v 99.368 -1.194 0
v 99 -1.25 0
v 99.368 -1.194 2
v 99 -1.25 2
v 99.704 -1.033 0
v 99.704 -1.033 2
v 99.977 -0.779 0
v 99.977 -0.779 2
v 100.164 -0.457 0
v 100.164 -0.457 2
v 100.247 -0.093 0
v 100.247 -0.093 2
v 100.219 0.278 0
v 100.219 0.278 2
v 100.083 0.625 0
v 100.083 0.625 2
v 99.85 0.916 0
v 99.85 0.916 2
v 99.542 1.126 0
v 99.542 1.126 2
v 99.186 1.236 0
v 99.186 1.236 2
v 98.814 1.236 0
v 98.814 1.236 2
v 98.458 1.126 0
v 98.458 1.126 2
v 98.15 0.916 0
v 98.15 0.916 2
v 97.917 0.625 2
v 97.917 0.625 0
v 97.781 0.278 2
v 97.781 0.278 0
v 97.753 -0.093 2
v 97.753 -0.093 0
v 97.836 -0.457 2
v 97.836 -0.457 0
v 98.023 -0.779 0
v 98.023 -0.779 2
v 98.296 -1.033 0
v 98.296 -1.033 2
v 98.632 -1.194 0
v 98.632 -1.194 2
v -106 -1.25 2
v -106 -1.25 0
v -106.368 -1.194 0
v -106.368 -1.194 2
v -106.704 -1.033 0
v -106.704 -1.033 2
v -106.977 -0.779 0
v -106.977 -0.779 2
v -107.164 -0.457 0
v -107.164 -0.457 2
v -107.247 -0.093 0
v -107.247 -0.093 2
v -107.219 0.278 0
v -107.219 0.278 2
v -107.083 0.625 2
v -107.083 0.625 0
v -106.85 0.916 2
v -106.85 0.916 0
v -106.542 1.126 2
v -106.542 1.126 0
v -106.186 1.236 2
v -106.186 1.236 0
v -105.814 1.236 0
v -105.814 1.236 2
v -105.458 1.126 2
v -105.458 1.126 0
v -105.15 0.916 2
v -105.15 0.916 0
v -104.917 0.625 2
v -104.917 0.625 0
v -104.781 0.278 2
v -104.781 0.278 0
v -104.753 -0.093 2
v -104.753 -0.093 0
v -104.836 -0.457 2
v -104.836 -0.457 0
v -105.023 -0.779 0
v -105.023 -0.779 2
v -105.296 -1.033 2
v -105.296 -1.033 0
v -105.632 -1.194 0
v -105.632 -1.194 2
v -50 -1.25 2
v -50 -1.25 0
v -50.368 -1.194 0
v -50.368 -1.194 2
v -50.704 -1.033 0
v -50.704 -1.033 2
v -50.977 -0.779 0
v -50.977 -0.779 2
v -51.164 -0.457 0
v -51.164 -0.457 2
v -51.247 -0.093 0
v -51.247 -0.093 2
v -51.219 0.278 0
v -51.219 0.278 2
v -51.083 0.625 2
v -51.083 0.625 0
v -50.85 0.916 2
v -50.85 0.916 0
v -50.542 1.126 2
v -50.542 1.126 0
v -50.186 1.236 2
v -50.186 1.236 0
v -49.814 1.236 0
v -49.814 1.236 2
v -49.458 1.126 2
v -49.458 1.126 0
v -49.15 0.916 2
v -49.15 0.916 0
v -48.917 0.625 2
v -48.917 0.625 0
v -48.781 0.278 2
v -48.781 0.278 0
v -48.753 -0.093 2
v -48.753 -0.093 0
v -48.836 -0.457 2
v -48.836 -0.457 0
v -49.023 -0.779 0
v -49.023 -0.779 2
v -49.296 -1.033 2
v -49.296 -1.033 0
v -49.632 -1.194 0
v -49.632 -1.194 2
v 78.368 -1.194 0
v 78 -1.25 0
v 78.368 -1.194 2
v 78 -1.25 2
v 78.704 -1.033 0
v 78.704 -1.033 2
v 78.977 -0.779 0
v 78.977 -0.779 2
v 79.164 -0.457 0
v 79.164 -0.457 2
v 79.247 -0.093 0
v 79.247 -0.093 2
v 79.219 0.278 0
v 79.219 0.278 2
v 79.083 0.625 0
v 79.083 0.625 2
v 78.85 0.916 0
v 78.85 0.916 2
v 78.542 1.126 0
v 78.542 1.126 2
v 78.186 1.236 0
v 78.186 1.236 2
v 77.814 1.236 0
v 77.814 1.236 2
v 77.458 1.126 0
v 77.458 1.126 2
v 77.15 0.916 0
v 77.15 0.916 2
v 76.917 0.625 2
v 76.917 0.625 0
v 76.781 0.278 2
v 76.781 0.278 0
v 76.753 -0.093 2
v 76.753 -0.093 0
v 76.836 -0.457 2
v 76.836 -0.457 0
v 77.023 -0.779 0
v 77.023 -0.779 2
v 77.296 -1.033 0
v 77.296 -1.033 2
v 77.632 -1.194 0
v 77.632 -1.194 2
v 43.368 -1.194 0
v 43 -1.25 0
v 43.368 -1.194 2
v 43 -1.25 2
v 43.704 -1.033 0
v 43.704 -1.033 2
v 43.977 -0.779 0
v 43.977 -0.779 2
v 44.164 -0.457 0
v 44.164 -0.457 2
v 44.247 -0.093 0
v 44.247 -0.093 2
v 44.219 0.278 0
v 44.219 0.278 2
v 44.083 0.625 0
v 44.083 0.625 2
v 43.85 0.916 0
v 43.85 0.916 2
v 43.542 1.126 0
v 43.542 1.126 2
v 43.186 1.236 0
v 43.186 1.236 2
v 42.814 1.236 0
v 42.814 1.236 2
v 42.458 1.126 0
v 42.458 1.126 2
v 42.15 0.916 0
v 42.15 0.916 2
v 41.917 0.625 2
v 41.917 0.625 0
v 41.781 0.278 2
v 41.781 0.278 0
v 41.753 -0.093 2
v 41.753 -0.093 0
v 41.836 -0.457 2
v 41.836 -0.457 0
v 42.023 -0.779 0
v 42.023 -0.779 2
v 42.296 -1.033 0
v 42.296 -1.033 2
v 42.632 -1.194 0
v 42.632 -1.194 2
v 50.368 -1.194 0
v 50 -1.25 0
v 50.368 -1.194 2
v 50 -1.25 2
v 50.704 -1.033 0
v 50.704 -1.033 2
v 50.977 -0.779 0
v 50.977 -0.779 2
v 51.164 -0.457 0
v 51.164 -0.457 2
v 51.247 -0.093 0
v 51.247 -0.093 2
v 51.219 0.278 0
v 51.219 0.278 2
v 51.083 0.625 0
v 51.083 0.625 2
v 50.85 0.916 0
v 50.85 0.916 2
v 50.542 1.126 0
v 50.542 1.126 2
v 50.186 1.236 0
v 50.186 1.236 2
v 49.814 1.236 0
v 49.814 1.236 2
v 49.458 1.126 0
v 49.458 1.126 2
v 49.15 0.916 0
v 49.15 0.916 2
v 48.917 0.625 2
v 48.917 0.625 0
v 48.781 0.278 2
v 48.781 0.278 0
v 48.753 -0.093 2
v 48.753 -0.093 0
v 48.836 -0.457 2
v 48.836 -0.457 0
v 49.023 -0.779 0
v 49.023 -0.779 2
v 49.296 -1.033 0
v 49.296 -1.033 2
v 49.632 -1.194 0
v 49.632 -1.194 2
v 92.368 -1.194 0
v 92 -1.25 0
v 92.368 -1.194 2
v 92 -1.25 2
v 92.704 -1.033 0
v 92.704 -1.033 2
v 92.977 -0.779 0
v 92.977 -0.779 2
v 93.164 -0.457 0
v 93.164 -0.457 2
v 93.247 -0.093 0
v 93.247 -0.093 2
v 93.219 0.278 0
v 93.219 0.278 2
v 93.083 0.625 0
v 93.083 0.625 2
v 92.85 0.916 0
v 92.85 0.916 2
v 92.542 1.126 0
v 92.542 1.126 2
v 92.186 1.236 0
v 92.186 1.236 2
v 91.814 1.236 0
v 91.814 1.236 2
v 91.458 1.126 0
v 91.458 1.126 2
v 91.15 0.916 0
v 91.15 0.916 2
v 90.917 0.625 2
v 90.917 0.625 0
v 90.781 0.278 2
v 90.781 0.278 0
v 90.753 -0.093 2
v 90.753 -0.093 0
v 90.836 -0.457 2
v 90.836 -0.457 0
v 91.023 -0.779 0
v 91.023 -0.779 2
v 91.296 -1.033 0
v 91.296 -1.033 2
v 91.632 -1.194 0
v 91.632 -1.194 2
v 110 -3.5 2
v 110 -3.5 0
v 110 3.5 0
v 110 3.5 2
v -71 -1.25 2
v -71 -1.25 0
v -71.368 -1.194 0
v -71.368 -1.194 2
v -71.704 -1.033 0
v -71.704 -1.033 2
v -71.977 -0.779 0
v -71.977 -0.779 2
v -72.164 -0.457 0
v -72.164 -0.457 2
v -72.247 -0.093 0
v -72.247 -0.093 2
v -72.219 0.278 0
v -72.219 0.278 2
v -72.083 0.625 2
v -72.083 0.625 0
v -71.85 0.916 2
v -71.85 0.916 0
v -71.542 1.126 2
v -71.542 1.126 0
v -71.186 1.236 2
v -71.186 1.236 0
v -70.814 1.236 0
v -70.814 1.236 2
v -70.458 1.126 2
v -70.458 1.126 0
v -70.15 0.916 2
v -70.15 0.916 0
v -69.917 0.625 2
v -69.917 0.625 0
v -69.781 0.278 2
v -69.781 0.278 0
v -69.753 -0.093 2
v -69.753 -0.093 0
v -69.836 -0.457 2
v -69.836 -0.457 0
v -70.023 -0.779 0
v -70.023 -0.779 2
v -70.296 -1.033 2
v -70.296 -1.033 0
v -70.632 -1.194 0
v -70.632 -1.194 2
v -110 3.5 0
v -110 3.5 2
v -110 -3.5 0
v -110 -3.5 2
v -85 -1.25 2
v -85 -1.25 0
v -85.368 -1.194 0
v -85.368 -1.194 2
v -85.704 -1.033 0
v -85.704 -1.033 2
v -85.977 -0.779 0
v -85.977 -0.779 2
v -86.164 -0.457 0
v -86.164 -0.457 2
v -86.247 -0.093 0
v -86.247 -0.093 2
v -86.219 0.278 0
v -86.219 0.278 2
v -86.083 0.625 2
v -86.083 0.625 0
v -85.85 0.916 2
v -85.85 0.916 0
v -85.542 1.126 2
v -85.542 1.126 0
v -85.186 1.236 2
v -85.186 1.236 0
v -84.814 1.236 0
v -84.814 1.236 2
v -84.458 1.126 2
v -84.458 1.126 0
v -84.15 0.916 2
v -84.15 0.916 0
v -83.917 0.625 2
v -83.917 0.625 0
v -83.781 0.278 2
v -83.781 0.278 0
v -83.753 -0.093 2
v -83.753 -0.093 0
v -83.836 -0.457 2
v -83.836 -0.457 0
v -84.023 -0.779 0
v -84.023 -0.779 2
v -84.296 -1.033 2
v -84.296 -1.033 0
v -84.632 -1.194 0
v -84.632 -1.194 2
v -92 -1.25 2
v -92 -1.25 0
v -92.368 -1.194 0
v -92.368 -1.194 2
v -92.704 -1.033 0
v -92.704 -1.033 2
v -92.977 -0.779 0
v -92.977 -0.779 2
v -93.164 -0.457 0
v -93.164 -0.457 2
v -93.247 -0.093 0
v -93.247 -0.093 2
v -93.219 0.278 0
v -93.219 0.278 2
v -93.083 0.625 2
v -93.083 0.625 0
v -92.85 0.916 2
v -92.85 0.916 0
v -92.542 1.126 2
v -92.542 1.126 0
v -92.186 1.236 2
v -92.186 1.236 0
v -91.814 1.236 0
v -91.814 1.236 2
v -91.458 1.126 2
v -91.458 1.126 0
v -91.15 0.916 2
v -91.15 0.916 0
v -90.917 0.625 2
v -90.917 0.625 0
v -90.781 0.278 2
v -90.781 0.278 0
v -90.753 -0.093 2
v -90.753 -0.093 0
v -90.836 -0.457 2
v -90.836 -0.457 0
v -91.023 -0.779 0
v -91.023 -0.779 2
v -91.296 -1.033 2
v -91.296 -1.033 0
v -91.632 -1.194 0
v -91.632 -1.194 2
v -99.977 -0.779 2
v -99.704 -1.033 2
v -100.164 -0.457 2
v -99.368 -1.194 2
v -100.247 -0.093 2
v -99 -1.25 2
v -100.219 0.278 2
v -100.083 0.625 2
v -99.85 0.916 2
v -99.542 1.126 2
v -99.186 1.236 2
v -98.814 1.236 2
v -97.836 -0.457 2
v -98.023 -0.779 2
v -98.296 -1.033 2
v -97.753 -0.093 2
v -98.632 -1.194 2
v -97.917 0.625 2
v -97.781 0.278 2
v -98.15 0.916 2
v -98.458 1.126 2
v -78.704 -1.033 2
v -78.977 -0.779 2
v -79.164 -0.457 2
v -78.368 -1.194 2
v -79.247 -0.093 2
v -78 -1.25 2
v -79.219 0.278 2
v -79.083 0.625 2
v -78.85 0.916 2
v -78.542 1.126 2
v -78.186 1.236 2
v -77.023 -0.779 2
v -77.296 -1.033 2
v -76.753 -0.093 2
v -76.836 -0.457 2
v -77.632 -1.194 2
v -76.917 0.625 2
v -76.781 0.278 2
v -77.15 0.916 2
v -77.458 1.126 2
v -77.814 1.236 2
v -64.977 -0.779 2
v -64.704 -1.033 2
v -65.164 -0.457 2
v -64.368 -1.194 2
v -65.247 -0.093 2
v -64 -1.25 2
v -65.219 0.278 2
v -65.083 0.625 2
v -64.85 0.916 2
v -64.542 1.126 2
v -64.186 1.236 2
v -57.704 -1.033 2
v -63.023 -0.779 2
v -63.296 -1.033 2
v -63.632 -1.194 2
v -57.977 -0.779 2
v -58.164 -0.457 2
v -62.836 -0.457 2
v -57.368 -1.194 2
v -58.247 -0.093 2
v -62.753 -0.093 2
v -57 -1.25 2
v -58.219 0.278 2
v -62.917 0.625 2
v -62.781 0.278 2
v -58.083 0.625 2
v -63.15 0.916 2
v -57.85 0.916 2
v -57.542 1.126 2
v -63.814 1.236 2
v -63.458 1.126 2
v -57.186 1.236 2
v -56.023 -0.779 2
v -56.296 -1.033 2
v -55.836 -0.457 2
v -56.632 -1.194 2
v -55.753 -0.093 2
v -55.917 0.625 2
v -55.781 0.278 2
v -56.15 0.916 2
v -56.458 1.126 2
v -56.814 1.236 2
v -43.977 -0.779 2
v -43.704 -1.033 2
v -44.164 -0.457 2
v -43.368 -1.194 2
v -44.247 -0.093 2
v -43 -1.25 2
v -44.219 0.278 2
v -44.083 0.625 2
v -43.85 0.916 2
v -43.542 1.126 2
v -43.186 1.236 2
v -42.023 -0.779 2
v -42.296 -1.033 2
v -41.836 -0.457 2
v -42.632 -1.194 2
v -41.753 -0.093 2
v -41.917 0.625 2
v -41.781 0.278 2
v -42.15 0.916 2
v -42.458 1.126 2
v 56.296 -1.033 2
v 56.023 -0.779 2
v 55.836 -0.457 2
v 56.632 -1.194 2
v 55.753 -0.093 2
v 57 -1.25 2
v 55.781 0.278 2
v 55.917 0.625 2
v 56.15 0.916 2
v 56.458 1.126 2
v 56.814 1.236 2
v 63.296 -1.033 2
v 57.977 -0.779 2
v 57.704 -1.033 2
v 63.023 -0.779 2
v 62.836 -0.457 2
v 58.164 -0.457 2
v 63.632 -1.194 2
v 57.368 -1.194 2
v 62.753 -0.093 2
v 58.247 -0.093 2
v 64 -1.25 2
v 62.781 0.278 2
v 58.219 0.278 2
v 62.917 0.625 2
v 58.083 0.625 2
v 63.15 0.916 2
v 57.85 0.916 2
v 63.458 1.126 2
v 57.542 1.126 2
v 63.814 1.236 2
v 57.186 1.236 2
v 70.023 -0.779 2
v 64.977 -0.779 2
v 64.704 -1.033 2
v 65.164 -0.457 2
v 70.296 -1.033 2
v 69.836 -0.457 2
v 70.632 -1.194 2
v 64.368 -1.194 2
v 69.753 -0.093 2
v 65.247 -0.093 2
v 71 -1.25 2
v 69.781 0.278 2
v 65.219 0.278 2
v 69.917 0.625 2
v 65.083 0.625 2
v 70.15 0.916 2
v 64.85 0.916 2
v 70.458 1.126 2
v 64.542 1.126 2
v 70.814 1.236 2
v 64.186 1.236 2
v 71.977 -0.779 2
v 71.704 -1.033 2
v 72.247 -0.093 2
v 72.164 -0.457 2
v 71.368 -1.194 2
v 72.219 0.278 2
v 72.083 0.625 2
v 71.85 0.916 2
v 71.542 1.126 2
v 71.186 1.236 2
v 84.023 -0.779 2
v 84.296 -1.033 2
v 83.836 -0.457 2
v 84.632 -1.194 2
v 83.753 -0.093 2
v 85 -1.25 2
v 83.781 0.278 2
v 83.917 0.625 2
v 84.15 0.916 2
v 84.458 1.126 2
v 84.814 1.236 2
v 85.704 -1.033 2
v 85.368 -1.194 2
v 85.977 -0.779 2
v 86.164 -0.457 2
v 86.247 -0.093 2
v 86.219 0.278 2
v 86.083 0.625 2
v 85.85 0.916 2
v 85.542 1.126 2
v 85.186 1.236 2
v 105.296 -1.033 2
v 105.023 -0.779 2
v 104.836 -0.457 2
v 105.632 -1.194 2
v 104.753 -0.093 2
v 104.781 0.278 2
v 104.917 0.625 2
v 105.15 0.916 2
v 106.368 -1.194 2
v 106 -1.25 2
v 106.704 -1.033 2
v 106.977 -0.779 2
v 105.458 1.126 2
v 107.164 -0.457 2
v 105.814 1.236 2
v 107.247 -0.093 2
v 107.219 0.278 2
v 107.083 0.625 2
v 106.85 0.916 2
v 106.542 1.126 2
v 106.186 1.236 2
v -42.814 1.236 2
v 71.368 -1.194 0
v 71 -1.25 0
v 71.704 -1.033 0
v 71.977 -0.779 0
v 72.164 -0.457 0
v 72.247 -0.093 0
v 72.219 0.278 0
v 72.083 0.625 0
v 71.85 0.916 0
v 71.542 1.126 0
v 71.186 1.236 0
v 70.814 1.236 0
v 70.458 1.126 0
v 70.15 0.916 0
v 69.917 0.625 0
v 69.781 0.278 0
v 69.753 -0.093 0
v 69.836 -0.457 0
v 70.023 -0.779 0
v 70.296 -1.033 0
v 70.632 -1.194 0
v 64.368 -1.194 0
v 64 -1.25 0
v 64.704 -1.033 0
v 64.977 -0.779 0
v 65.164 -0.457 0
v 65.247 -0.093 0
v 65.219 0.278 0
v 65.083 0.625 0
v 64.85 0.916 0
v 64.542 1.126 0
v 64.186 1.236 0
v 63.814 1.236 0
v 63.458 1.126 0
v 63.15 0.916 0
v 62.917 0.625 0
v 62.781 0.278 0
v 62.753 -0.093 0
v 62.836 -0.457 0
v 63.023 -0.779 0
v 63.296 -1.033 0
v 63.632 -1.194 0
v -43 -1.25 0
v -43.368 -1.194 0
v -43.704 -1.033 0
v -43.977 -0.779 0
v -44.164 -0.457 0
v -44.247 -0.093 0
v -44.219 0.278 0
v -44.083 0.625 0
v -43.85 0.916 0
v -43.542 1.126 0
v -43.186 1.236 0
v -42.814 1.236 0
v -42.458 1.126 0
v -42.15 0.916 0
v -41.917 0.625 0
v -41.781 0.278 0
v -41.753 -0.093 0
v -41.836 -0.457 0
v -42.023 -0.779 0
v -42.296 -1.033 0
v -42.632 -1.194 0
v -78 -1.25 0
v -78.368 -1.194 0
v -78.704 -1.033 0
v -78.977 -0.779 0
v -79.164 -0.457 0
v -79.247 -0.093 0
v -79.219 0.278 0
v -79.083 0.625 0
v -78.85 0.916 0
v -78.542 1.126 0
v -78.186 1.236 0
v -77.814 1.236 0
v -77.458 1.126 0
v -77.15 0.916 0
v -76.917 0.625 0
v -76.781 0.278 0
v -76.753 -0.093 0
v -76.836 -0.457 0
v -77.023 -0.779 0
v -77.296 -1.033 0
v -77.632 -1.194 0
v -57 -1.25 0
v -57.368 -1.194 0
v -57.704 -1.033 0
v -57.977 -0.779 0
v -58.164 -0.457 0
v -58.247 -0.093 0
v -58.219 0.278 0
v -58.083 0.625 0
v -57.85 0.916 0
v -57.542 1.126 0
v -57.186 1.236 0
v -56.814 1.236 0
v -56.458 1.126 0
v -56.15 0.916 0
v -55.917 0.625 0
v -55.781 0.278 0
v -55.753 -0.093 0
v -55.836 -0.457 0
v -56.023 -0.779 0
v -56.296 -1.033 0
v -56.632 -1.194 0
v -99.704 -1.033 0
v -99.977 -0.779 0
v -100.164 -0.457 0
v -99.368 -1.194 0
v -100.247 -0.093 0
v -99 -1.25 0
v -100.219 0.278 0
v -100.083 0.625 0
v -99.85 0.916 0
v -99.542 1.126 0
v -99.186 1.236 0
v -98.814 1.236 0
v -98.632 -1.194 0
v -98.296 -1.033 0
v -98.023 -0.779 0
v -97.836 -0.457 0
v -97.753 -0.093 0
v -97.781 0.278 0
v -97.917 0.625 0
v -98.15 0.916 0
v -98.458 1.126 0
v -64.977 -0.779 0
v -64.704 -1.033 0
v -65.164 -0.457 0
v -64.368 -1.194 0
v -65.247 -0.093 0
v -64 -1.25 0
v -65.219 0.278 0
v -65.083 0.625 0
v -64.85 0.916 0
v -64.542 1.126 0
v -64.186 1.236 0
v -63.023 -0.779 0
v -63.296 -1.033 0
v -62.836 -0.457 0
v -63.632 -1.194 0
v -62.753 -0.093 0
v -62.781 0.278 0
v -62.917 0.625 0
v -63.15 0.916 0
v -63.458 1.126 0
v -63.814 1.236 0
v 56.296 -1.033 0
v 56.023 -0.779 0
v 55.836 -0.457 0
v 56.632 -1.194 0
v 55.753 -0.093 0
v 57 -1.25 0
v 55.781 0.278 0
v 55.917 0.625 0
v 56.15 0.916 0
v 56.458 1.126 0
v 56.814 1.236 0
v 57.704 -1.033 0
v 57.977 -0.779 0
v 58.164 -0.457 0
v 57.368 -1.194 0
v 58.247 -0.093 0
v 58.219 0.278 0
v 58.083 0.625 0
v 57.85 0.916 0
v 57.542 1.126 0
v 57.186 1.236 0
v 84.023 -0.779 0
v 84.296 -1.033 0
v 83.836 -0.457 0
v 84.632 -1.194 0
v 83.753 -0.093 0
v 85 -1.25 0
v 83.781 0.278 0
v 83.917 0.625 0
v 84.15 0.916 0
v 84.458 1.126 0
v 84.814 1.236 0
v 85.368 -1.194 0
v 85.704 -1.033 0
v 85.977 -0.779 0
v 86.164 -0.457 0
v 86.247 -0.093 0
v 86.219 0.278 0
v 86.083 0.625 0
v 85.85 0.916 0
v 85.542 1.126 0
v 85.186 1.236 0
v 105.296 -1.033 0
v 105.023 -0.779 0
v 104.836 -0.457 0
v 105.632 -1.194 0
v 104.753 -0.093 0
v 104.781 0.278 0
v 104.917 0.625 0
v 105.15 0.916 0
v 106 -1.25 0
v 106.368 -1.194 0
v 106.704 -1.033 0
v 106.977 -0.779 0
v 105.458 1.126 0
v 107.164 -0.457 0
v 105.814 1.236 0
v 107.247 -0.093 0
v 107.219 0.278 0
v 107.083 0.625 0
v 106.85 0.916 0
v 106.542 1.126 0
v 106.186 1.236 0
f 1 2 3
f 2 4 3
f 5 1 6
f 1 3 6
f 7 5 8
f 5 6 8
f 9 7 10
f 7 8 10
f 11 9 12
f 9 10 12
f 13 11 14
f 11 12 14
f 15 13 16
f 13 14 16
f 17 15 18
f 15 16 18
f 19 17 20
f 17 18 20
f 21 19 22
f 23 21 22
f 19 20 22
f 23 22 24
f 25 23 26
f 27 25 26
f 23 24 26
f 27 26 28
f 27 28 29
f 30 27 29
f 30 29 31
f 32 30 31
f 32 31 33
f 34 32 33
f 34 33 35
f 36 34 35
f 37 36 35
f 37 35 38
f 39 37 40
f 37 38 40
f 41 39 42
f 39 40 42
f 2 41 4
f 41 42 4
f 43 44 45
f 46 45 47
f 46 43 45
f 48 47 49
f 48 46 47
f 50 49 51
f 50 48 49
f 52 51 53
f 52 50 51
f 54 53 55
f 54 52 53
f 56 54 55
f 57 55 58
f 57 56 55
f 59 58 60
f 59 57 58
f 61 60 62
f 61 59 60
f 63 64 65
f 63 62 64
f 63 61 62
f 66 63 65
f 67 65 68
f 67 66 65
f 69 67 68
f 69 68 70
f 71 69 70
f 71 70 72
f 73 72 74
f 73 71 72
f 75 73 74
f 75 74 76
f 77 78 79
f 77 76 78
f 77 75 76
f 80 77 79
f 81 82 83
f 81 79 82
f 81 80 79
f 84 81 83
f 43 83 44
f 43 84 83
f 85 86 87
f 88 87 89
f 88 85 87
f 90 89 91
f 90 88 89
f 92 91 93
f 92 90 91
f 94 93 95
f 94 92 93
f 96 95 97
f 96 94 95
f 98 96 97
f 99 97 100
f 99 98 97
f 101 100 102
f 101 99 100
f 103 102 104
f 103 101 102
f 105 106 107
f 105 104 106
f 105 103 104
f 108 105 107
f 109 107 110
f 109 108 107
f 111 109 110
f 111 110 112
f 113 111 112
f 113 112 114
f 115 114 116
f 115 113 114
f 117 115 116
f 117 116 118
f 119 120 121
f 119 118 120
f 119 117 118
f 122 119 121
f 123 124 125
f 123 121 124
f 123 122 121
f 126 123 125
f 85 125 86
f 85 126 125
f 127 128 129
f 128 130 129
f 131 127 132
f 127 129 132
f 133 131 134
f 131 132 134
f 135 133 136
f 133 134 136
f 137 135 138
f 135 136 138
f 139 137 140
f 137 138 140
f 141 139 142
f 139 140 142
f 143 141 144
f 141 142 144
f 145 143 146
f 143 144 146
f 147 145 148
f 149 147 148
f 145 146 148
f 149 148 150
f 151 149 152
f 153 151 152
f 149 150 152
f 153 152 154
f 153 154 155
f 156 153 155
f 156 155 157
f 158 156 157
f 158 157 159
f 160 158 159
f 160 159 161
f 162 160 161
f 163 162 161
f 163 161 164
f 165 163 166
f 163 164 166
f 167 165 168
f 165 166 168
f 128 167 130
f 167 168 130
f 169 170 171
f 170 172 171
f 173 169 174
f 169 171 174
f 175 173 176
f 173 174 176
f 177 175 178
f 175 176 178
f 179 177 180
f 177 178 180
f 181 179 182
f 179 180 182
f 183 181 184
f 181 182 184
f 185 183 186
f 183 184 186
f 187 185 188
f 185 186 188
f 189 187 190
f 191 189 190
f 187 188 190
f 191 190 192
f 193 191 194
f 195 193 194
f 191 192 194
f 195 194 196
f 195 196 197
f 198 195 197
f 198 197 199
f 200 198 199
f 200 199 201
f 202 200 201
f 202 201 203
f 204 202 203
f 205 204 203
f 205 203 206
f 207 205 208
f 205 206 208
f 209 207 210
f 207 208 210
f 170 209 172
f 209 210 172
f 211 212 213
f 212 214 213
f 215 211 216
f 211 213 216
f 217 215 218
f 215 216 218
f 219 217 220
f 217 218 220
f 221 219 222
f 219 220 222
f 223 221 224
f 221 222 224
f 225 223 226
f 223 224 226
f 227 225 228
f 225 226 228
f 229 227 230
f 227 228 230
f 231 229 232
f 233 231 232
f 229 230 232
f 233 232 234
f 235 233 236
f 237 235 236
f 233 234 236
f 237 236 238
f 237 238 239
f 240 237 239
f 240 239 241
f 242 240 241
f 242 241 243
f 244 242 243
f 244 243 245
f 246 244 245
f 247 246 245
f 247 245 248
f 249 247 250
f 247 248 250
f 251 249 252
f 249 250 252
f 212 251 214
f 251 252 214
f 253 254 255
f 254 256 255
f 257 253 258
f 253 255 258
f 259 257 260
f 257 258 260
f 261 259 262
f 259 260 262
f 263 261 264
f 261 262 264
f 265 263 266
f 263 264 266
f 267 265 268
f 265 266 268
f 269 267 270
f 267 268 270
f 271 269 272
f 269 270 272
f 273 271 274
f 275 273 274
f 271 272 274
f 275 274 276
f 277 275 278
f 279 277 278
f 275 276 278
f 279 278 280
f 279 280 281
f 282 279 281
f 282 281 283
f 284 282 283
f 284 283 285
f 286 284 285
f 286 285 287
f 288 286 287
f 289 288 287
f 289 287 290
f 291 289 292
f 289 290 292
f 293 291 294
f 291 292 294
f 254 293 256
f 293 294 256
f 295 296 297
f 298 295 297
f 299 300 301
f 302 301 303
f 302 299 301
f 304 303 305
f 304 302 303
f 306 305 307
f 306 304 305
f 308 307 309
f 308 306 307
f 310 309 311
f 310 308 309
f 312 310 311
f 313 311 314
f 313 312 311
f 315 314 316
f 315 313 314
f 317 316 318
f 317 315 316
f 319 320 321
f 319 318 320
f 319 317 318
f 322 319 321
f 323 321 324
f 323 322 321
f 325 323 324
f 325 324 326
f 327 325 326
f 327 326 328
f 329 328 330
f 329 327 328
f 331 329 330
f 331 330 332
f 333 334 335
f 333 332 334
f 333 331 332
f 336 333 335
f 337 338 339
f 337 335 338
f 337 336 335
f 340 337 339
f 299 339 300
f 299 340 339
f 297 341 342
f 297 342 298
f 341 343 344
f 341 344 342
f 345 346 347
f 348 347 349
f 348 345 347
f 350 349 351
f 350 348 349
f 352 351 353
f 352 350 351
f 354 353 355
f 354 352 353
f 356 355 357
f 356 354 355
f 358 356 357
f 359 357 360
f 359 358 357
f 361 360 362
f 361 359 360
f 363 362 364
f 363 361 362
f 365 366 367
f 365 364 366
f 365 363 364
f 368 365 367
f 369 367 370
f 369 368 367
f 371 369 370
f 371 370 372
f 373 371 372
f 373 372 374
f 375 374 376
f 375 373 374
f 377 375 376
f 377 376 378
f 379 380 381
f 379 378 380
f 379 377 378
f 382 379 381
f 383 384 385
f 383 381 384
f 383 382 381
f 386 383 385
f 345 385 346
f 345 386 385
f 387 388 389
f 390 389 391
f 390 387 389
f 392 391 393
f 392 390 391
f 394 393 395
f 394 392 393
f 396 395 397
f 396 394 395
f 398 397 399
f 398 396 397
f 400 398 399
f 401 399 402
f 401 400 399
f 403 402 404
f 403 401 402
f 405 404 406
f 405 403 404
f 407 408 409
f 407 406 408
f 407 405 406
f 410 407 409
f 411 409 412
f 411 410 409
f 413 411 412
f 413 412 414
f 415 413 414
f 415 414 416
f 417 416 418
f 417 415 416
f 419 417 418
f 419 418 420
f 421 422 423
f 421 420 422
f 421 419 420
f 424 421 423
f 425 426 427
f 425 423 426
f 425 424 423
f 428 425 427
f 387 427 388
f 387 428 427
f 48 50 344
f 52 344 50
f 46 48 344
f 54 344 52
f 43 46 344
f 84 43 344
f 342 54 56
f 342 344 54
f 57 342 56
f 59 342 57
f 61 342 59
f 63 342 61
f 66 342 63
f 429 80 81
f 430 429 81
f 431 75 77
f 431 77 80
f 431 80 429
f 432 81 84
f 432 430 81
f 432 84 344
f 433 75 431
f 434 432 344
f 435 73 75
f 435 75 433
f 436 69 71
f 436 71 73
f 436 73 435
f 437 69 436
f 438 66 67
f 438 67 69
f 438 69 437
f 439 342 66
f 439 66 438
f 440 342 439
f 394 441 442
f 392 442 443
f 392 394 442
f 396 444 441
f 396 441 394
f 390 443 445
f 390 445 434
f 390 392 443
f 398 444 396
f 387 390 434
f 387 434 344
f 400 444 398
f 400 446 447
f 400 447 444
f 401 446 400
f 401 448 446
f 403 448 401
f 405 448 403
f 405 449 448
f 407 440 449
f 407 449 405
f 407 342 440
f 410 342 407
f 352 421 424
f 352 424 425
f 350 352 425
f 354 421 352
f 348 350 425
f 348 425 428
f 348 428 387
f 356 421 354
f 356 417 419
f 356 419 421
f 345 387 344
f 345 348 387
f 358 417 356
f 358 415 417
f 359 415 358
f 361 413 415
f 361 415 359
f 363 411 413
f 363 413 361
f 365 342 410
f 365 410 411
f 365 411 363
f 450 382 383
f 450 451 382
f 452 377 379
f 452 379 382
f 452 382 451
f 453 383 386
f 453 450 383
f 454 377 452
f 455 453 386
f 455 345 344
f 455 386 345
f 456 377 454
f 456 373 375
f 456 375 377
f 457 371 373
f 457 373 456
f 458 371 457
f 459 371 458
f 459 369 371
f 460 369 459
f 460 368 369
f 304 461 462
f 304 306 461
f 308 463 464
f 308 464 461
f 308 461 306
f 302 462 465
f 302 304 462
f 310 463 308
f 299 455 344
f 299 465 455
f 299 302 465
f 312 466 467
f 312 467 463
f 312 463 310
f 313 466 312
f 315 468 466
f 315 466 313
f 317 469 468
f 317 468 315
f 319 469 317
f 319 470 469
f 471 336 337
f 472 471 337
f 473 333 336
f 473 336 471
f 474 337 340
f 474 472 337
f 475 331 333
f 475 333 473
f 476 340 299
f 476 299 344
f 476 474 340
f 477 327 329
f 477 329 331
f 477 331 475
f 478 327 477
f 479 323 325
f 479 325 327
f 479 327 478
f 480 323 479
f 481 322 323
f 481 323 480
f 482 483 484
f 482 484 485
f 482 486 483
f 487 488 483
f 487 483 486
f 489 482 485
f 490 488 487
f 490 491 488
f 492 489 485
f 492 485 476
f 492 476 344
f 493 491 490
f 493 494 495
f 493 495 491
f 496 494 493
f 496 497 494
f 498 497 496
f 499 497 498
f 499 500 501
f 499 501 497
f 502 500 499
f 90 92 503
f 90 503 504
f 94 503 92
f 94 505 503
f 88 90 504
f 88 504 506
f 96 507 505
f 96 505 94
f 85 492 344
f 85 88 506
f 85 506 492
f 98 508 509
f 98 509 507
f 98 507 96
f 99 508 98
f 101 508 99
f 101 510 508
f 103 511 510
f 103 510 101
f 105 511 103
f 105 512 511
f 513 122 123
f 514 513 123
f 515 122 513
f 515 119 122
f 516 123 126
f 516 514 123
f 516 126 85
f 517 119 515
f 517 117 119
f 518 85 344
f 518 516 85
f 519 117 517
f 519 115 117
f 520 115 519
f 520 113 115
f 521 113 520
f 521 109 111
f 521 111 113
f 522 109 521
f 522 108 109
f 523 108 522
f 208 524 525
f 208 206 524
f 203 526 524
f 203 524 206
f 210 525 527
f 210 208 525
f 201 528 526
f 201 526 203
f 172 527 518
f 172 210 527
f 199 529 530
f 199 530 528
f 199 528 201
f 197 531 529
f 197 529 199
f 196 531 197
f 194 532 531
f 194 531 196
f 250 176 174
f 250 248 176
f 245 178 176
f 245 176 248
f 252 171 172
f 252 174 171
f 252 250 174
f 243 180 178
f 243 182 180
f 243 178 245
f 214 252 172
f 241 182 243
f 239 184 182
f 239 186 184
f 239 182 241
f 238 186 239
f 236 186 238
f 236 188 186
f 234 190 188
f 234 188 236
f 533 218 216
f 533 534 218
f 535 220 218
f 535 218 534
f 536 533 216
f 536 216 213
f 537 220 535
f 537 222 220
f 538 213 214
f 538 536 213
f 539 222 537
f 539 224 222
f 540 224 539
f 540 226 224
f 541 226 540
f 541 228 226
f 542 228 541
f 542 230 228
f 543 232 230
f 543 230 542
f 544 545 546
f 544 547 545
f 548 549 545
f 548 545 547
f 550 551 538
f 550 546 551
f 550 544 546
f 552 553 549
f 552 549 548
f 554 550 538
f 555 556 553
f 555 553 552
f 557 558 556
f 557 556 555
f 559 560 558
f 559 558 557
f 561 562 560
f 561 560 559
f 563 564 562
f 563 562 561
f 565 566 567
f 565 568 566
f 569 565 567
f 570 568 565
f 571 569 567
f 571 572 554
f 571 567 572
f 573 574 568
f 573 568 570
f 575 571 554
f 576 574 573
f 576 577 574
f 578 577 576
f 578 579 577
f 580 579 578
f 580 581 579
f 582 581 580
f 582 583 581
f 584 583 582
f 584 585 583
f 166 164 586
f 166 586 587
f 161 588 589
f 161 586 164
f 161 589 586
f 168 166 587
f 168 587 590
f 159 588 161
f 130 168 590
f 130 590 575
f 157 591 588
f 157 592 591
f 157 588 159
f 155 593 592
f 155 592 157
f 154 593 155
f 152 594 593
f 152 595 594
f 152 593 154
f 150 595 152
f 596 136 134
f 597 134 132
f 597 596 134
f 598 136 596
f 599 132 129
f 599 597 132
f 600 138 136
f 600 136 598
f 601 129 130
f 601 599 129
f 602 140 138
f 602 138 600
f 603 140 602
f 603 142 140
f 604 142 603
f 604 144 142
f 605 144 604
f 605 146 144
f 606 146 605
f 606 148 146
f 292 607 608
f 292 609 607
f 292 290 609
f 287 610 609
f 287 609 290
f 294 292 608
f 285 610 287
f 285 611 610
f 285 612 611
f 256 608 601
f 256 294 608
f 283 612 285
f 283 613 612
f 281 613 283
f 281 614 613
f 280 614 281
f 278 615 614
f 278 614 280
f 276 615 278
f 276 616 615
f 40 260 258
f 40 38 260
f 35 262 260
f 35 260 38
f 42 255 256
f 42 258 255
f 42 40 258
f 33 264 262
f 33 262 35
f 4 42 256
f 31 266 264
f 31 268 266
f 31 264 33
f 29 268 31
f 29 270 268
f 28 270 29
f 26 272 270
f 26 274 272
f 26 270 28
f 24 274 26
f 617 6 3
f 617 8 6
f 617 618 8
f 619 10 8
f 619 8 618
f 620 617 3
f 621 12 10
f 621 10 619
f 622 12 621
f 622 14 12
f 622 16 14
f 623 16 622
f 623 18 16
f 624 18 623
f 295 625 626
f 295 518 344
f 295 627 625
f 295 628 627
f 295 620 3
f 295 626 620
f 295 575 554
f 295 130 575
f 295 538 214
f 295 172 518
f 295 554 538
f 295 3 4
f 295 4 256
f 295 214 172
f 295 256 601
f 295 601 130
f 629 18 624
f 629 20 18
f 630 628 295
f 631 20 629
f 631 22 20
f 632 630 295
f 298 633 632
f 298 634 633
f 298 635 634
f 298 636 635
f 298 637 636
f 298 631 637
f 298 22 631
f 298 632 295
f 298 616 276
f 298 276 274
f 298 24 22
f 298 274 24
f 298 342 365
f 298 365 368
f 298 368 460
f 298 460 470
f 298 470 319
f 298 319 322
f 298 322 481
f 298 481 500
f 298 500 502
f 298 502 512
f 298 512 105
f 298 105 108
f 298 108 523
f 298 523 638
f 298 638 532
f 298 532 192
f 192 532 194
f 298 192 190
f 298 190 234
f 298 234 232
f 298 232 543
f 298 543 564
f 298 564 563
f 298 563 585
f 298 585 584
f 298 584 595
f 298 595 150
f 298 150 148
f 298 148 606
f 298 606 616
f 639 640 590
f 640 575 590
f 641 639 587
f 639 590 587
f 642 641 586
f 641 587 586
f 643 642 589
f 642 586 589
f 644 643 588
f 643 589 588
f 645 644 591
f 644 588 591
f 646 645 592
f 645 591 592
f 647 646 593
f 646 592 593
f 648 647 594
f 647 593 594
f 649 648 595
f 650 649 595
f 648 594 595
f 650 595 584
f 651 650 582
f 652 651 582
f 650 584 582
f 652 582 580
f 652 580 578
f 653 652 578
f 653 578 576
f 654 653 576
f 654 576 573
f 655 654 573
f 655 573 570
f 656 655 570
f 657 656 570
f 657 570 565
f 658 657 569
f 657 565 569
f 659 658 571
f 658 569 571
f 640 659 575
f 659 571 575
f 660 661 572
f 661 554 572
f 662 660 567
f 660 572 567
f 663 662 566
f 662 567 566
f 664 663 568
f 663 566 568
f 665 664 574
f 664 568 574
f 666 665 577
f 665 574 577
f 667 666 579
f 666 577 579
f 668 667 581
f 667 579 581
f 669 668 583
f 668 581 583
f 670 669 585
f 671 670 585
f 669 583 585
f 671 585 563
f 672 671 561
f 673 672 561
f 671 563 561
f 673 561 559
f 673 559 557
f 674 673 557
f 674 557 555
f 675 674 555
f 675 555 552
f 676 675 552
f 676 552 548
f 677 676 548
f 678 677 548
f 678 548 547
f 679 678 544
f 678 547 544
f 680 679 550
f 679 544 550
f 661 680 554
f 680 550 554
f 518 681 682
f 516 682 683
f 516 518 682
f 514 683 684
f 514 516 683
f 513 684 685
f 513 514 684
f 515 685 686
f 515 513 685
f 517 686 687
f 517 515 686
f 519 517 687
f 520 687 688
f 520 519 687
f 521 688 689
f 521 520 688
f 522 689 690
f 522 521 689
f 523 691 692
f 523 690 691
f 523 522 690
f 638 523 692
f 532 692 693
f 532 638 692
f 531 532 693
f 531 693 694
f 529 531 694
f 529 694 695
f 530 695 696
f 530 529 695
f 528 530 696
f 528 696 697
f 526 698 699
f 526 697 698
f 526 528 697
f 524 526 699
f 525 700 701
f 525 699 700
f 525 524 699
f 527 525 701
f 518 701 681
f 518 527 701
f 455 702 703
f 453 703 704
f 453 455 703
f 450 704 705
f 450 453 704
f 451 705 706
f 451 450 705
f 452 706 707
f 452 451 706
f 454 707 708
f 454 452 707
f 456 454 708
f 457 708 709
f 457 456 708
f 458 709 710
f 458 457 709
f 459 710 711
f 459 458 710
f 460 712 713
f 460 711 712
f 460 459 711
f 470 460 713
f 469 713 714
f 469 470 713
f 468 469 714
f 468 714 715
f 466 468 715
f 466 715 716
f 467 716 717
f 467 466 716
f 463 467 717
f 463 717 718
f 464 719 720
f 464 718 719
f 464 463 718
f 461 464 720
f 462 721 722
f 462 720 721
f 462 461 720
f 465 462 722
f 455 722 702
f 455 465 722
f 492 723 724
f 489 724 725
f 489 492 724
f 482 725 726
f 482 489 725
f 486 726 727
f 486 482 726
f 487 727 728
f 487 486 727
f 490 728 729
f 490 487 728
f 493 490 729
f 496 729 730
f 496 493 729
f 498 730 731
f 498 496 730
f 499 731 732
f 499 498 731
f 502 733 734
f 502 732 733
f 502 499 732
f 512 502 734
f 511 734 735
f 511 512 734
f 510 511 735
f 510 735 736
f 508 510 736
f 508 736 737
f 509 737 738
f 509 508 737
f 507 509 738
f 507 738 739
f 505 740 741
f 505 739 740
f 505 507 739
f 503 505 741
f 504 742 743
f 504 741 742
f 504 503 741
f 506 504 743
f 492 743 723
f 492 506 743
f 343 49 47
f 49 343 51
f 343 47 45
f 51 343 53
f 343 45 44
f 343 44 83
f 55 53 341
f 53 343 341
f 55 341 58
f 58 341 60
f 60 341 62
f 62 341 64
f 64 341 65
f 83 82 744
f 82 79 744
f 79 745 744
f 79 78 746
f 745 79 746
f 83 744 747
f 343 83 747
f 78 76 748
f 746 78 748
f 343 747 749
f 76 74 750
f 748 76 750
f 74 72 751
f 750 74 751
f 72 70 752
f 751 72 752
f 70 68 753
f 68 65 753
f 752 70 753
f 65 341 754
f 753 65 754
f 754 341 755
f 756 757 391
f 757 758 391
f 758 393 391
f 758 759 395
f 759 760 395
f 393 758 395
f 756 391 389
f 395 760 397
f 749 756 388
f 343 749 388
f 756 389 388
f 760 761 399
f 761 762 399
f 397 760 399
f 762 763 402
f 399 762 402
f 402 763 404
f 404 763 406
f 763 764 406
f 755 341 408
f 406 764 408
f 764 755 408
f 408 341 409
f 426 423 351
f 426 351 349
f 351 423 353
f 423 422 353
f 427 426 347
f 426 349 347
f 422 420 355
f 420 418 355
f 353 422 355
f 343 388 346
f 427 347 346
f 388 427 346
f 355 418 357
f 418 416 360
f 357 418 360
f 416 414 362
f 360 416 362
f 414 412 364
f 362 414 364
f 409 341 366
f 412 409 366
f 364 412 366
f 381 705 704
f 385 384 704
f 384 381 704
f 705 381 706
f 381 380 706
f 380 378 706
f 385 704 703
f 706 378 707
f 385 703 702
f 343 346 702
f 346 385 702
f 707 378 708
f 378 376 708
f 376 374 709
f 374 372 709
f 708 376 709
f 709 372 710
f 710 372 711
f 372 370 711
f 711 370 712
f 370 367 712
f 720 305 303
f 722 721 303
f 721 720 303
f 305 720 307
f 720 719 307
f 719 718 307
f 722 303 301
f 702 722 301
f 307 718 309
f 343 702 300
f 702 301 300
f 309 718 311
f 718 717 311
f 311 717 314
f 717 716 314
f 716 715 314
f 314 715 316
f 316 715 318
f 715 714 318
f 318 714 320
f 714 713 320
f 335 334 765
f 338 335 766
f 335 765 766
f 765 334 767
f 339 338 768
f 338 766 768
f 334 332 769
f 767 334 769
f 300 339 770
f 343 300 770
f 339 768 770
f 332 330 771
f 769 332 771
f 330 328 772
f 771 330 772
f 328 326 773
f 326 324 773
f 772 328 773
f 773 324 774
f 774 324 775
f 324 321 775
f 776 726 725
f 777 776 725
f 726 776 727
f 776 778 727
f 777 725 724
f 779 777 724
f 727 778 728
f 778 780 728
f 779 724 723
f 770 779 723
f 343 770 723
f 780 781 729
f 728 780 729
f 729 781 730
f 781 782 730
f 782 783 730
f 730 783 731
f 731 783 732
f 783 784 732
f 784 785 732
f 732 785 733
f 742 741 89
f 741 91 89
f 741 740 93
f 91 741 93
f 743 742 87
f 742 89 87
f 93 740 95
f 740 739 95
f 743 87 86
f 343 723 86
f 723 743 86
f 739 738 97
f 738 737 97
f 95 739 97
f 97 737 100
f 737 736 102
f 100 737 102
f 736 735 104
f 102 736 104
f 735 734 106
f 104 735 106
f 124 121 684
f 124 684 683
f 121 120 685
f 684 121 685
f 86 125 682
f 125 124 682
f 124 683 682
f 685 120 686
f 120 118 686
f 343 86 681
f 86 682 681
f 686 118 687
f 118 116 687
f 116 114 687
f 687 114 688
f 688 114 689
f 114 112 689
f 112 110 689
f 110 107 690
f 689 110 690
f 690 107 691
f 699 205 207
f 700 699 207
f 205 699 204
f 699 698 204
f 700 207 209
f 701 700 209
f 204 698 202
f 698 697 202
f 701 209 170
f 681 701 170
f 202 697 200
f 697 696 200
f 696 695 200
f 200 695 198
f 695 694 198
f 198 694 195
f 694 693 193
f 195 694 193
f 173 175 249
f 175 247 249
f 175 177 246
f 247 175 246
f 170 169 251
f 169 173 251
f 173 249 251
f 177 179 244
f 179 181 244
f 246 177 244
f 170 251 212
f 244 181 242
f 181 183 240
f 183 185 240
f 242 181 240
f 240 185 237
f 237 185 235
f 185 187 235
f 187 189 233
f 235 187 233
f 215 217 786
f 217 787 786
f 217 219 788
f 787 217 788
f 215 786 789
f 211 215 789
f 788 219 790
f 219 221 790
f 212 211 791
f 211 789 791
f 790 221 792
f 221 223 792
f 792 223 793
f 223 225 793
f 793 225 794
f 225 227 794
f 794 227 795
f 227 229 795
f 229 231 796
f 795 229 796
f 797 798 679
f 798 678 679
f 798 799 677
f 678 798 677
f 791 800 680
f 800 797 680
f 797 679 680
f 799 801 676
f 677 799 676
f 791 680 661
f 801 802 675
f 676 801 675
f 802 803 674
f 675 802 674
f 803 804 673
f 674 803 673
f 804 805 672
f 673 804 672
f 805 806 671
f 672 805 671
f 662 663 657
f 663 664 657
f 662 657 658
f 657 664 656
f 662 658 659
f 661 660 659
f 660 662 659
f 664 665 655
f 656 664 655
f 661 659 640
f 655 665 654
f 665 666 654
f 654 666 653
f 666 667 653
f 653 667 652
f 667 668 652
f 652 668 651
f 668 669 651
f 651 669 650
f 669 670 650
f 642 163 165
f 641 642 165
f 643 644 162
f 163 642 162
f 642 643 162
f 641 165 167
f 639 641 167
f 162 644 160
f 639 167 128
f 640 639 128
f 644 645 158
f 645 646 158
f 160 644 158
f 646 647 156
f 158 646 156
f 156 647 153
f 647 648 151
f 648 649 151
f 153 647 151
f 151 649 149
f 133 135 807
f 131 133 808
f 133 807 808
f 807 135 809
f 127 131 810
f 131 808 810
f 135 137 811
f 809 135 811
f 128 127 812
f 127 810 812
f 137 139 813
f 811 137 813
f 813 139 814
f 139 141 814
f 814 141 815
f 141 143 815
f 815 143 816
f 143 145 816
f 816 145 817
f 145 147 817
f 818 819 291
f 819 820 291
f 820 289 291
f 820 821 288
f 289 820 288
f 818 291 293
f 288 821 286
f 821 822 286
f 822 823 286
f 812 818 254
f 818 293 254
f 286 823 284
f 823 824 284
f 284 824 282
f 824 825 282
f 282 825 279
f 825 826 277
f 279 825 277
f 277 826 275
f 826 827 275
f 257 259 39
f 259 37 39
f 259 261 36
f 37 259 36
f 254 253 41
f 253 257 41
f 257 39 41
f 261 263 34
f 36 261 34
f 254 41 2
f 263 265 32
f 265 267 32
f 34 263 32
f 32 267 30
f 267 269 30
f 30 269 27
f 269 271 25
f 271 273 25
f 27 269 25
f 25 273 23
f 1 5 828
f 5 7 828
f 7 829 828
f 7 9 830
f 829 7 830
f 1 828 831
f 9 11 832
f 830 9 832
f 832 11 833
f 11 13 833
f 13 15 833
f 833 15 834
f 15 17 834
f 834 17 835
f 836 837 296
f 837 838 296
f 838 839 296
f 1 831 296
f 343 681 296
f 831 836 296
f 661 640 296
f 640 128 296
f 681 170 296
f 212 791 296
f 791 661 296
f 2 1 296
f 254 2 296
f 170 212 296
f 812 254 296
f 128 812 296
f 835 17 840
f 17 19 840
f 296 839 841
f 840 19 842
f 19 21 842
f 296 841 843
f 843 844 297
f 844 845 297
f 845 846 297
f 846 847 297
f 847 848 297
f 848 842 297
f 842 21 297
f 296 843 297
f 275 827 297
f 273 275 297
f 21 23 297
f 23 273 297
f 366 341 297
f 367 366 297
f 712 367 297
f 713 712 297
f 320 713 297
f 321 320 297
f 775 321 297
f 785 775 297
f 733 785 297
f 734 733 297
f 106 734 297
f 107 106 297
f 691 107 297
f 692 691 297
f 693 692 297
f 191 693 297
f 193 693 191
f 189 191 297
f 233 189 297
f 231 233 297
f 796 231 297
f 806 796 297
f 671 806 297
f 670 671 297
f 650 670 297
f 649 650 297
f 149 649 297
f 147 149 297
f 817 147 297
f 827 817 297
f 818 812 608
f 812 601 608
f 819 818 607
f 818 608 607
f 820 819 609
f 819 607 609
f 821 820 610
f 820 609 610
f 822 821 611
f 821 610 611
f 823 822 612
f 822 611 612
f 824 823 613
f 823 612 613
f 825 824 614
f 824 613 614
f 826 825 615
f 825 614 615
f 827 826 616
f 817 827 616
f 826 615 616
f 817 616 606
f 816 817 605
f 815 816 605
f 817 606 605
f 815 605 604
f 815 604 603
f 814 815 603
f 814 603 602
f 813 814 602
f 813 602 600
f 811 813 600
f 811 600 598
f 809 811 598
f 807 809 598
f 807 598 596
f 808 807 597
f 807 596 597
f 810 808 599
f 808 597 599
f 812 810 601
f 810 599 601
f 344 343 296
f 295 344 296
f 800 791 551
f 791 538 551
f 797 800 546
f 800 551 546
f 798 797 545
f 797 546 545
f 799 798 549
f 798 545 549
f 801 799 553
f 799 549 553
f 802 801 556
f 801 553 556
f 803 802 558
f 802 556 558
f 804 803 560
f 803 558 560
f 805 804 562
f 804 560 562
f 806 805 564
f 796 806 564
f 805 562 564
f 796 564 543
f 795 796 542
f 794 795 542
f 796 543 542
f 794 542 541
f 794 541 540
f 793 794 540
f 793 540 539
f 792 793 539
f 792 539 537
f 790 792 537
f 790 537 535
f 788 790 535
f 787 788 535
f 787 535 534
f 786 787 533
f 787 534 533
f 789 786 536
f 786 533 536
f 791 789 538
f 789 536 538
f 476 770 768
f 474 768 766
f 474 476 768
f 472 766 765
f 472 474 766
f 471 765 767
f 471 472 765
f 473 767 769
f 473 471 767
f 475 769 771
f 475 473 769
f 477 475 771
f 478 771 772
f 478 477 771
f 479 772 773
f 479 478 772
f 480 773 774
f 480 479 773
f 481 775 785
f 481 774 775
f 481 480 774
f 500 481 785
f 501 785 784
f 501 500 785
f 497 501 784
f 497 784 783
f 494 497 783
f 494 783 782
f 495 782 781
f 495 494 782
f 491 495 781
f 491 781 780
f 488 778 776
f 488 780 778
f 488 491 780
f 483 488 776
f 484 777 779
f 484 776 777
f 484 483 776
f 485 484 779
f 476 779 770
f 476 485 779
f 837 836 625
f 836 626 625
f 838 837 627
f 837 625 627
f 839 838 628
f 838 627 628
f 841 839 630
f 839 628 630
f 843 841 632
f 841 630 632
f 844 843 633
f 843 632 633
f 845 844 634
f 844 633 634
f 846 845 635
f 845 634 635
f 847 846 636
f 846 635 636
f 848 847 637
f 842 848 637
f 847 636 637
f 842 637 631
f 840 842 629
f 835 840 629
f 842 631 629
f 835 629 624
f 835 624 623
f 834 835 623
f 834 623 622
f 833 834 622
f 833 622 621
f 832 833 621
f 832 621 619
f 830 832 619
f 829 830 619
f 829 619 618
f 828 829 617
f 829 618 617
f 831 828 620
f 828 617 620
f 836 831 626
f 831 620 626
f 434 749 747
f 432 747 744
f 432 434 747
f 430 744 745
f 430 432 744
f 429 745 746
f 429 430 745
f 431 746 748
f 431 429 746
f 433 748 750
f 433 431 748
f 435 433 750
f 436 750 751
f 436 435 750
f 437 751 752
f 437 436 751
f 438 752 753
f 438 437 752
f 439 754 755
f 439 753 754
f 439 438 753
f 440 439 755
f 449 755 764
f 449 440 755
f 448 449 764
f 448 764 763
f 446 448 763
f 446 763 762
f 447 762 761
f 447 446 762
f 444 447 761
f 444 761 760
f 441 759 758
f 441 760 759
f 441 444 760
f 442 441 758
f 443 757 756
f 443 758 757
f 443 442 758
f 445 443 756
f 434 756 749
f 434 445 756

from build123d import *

# Parameters (mm, degrees)
SKETCH_1_W             = 220
SKETCH_1_H             = 7
EXTRUDE_1_DEPTH        = 2
PATTERN_LINEAR_2_COUNT = 10
PATTERN_LINEAR_2_PITCH = 7


with BuildPart() as part:
    # 草图1 → 凸台-拉伸1 (new body)
    with BuildSketch(Plane.XY):
        Rectangle(SKETCH_1_W, SKETCH_1_H)
    extrude(amount=EXTRUDE_1_DEPTH)

    # 草图6 → M3 螺纹孔2 (revolve, cut)
    with BuildSketch(Plane(origin=(-106, 0, 2), x_dir=(0, -1, 0), z_dir=(1, 0, 0))):
        Polygon((0, 0), (0, 8.251075774), (1.25, 7.5), (1.25, 0), align=None)
    hole_wizard_m3_2 = revolve(axis=Axis((-106, 0, 8.35), (0, 0, -1)), mode=Mode.SUBTRACT)

    # 阵列(线性)2: M3 螺纹孔2 ×10
    with Locations(*[(i * PATTERN_LINEAR_2_PITCH, 0, 0) for i in range(1, PATTERN_LINEAR_2_COUNT)]):
        add(hole_wizard_m3_2, mode=Mode.SUBTRACT)

    # 镜向1: M3 螺纹孔2 across plane
    add(hole_wizard_m3_2.mirror(Plane(origin=(0, 0, 0), x_dir=(0, 0, 1), z_dir=(1, 0, 0))), mode=Mode.SUBTRACT)

    # 镜向1 copy 1 sketch → 镜向1 copy 1 (revolve, cut)
    with BuildSketch(Plane(origin=(99, 0, 2), x_dir=(0, -1, 0), z_dir=(-1, 0, 0))):
        Polygon((0, 0), (0, -8.251075774), (1.25, -7.5), (1.25, 0), align=None)
    revolve(axis=Axis((99, 0, 8.35), (0, 0, 1)), mode=Mode.SUBTRACT)

    # 镜向1 copy 2 sketch → 镜向1 copy 2 (revolve, cut)
    with BuildSketch(Plane(origin=(92, 0, 2), x_dir=(0, -1, 0), z_dir=(-1, 0, 0))):
        Polygon((0, 0), (0, -8.251075774), (1.25, -7.5), (1.25, 0), align=None)
    revolve(axis=Axis((92, 0, 8.35), (0, 0, 1)), mode=Mode.SUBTRACT)

    # 镜向1 copy 3 sketch → 镜向1 copy 3 (revolve, cut)
    with BuildSketch(Plane(origin=(85, 0, 2), x_dir=(0, -1, 0), z_dir=(-1, 0, 0))):
        Polygon((0, 0), (0, -8.251075774), (1.25, -7.5), (1.25, 0), align=None)
    revolve(axis=Axis((85, 0, 8.35), (0, 0, 1)), mode=Mode.SUBTRACT)

    # 镜向1 copy 4 sketch → 镜向1 copy 4 (revolve, cut)
    with BuildSketch(Plane(origin=(78, 0, 2), x_dir=(0, -1, 0), z_dir=(-1, 0, 0))):
        Polygon((0, 0), (0, -8.251075774), (1.25, -7.5), (1.25, 0), align=None)
    revolve(axis=Axis((78, 0, 8.35), (0, 0, 1)), mode=Mode.SUBTRACT)

    # 镜向1 copy 5 sketch → 镜向1 copy 5 (revolve, cut)
    with BuildSketch(Plane(origin=(71, 0, 2), x_dir=(0, -1, 0), z_dir=(-1, 0, 0))):
        Polygon((0, 0), (0, -8.251075774), (1.25, -7.5), (1.25, 0), align=None)
    revolve(axis=Axis((71, 0, 8.35), (0, 0, 1)), mode=Mode.SUBTRACT)

    # 镜向1 copy 6 sketch → 镜向1 copy 6 (revolve, cut)
    with BuildSketch(Plane(origin=(64, 0, 2), x_dir=(0, -1, 0), z_dir=(-1, 0, 0))):
        Polygon((0, 0), (0, -8.251075774), (1.25, -7.5), (1.25, 0), align=None)
    revolve(axis=Axis((64, 0, 8.35), (0, 0, 1)), mode=Mode.SUBTRACT)

    # 镜向1 copy 7 sketch → 镜向1 copy 7 (revolve, cut)
    with BuildSketch(Plane(origin=(57, 0, 2), x_dir=(0, -1, 0), z_dir=(-1, 0, 0))):
        Polygon((0, 0), (0, -8.251075774), (1.25, -7.5), (1.25, 0), align=None)
    revolve(axis=Axis((57, 0, 8.35), (0, 0, 1)), mode=Mode.SUBTRACT)

    # 镜向1 copy 8 sketch → 镜向1 copy 8 (revolve, cut)
    with BuildSketch(Plane(origin=(50, 0, 2), x_dir=(0, -1, 0), z_dir=(-1, 0, 0))):
        Polygon((0, 0), (0, -8.251075774), (1.25, -7.5), (1.25, 0), align=None)
    revolve(axis=Axis((50, 0, 8.35), (0, 0, 1)), mode=Mode.SUBTRACT)

    # 镜向1 copy 9 sketch → 镜向1 copy 9 (revolve, cut)
    with BuildSketch(Plane(origin=(43, 0, 2), x_dir=(0, -1, 0), z_dir=(-1, 0, 0))):
        Polygon((0, 0), (0, -8.251075774), (1.25, -7.5), (1.25, 0), align=None)
    revolve(axis=Axis((43, 0, 8.35), (0, 0, 1)), mode=Mode.SUBTRACT)


solid = part.part
